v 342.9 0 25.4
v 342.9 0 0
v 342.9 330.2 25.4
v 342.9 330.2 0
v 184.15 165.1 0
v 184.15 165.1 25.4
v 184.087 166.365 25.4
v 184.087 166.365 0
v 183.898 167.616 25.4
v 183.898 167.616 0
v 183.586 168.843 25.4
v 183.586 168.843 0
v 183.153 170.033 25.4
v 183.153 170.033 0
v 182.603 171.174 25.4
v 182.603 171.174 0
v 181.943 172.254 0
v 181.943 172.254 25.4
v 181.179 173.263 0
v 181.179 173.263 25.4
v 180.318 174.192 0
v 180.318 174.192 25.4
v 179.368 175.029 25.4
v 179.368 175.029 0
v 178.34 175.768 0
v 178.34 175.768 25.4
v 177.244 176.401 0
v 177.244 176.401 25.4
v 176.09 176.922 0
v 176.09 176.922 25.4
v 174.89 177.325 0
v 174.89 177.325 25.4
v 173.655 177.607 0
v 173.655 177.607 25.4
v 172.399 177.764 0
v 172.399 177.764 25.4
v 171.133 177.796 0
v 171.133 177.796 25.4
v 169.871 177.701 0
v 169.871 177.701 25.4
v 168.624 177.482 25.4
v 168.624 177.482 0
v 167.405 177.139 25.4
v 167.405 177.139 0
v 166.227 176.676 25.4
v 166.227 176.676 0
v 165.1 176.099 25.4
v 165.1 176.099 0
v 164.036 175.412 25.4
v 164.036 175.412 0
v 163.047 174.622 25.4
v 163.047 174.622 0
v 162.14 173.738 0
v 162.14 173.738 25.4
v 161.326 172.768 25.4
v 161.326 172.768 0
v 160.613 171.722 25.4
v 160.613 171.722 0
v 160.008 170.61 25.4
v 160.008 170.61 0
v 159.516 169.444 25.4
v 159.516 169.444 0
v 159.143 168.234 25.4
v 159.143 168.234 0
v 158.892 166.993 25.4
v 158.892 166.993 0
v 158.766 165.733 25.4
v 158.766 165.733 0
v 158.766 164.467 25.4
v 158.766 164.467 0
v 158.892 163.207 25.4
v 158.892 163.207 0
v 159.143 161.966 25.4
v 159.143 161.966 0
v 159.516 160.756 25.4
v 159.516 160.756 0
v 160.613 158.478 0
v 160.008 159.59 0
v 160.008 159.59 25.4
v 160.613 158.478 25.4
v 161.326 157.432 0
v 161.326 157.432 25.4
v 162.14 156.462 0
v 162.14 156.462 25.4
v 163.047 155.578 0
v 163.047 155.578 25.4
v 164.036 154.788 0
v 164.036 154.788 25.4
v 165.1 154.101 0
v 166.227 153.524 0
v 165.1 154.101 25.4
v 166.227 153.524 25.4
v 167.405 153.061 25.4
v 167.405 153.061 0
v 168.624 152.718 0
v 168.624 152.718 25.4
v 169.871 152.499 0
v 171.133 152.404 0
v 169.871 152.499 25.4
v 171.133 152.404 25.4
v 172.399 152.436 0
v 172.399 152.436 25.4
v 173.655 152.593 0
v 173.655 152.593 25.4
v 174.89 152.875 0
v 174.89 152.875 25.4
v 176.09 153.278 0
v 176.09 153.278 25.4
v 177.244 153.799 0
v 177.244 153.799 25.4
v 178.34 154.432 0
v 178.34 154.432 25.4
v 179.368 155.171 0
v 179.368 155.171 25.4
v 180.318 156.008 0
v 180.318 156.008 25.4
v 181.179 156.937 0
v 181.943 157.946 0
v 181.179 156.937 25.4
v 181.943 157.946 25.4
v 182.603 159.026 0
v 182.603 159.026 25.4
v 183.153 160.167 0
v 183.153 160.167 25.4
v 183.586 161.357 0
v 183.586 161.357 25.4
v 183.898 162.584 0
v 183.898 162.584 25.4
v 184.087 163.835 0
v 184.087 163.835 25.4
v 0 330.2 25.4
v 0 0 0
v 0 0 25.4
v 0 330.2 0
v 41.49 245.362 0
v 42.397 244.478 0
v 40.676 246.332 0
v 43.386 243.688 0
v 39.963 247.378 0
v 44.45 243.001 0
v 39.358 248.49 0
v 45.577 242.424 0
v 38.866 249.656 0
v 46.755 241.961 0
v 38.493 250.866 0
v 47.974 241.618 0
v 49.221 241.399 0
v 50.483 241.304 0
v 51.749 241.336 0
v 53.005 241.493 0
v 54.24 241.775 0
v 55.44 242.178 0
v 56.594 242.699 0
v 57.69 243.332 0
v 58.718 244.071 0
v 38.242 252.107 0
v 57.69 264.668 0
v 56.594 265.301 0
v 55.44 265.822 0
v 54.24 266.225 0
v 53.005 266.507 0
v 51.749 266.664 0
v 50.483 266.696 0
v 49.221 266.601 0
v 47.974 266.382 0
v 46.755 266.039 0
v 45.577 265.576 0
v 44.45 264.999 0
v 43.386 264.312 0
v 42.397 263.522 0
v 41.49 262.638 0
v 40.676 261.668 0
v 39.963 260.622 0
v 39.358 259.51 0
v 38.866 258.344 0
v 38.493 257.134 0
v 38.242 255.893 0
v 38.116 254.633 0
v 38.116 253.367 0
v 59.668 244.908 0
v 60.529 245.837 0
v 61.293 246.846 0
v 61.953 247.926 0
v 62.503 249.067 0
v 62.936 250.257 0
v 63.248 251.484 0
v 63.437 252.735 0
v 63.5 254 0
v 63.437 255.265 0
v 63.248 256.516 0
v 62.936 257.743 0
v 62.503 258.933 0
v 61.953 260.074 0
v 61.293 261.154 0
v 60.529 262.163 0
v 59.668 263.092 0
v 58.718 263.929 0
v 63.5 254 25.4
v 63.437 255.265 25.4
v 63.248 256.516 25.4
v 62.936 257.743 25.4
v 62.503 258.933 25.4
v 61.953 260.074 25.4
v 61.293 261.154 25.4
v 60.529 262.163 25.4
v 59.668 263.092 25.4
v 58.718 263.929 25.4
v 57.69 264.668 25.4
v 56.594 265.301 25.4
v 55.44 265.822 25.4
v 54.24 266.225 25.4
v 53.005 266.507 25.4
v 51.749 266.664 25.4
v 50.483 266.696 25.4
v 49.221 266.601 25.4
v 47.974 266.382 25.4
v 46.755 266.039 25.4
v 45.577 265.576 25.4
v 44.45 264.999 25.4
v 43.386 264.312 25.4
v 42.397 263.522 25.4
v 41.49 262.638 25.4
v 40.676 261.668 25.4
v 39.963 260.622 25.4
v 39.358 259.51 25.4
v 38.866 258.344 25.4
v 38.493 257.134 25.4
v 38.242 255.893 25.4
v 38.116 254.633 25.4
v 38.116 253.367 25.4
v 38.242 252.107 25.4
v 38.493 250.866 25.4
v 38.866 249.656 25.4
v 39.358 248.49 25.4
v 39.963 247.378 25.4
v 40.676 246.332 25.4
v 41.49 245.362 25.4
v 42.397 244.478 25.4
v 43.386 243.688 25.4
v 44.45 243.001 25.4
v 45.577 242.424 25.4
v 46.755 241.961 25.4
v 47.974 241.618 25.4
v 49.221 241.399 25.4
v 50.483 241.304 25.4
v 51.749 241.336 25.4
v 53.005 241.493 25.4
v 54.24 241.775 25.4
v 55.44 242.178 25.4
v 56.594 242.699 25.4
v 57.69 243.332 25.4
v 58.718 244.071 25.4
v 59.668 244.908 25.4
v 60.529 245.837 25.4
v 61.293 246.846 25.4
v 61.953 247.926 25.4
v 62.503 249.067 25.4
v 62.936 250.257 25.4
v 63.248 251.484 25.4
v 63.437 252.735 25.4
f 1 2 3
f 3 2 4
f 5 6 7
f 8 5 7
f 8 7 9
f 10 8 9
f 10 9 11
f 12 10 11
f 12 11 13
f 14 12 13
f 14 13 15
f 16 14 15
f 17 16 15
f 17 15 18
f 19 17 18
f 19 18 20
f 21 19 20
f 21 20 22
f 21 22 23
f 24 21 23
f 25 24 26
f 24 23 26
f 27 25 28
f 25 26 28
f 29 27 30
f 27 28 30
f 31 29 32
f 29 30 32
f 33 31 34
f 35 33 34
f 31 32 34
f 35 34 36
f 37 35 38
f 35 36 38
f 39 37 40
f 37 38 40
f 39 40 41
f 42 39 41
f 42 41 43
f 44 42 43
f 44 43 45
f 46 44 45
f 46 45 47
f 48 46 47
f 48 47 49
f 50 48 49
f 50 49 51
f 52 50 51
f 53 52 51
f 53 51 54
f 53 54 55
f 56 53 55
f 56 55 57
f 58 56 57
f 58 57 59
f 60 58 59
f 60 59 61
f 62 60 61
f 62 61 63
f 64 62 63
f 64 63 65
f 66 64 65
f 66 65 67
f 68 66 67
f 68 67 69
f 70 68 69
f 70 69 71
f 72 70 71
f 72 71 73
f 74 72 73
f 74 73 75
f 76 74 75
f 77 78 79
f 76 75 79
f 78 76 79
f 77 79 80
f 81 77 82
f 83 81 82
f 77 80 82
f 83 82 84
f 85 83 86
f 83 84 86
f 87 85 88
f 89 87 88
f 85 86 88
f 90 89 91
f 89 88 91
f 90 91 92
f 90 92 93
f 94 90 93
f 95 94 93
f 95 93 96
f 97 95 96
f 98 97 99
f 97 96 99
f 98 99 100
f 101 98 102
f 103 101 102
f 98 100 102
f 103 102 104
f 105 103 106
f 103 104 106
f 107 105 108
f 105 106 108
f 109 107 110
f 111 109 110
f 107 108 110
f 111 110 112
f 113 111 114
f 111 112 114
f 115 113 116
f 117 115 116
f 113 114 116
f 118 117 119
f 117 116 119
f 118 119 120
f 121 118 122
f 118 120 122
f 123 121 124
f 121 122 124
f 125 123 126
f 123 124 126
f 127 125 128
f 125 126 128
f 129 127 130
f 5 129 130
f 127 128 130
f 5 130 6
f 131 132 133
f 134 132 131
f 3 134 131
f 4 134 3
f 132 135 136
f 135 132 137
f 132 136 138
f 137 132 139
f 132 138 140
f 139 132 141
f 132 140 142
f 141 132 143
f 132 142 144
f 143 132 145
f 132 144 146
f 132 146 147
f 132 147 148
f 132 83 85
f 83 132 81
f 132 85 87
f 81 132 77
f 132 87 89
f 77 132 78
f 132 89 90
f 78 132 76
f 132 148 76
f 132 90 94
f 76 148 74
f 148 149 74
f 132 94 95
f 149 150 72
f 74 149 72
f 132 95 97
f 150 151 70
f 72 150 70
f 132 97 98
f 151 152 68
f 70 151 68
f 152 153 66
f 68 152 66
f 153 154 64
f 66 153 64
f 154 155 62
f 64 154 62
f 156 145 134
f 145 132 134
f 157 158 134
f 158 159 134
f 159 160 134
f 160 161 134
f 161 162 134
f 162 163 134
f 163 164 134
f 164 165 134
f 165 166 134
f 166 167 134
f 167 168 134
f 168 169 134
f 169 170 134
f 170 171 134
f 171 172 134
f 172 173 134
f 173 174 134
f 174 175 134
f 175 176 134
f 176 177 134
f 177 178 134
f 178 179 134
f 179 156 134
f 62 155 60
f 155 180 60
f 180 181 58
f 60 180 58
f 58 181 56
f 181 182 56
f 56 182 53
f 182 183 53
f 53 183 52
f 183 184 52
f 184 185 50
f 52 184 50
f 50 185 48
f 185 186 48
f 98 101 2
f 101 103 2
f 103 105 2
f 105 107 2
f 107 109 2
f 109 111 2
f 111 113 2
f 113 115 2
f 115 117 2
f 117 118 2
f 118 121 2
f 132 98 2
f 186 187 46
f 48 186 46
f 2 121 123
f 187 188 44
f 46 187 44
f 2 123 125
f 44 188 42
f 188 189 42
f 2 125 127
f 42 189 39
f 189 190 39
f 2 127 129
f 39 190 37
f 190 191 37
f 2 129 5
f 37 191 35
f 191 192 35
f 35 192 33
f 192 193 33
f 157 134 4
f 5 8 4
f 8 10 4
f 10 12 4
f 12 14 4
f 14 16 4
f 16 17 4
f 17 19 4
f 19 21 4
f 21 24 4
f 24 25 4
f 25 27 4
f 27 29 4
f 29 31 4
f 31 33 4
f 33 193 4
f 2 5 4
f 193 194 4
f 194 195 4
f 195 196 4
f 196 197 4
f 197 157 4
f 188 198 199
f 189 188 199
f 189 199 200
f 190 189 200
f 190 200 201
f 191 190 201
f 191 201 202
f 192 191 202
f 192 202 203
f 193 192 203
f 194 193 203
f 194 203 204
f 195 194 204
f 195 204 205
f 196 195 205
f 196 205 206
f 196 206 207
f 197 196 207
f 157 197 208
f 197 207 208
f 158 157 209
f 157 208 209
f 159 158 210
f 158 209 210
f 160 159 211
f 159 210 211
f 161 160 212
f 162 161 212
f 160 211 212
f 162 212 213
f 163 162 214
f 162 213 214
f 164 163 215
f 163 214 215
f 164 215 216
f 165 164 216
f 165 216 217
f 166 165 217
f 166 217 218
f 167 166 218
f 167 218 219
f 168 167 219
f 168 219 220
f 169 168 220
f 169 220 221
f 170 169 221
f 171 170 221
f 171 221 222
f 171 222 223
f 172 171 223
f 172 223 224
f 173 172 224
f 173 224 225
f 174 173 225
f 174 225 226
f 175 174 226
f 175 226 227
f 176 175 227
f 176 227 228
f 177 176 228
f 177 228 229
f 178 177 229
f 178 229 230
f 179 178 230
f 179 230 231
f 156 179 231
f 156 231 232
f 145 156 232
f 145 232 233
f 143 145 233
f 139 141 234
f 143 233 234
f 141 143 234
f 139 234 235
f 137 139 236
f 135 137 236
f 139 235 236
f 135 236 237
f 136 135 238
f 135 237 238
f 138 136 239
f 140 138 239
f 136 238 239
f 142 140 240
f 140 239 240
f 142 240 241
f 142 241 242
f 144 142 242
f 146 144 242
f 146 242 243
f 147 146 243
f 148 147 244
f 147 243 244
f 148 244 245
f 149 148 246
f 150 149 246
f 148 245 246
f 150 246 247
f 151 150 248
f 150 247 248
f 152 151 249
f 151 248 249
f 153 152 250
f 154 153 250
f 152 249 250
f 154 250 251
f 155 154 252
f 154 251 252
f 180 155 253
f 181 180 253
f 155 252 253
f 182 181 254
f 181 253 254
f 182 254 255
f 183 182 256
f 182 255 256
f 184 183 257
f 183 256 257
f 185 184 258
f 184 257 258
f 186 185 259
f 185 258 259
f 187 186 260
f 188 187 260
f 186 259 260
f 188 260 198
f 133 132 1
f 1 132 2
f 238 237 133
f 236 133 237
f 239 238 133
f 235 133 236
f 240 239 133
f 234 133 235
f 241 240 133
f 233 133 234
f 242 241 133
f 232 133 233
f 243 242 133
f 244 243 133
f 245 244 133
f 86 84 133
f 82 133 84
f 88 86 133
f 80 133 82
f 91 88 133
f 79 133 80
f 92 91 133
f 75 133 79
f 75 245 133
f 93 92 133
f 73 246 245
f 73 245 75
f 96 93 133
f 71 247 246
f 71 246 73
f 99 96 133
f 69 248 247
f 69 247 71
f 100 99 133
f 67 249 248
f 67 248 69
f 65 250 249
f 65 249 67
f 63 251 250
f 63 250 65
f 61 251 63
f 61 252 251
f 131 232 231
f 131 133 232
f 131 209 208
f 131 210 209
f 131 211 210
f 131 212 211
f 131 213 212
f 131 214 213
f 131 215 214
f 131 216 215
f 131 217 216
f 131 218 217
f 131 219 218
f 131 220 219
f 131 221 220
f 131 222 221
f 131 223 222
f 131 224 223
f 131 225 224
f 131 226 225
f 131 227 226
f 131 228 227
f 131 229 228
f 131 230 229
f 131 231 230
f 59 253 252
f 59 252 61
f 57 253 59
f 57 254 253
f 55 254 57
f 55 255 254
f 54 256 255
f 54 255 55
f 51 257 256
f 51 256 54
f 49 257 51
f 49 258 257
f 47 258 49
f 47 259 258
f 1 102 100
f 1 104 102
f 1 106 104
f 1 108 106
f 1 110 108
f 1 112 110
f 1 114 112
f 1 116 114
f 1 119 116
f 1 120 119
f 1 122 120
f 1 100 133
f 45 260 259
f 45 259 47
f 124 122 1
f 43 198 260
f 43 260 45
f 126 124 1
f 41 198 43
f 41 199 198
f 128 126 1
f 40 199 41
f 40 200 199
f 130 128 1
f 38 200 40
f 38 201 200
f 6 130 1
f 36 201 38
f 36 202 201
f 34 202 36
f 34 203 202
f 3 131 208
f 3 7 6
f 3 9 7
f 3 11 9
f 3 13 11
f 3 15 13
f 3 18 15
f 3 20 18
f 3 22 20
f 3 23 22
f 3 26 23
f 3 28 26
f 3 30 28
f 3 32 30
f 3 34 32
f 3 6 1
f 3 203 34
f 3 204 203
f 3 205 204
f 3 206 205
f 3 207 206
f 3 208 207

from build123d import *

# Parameters (mm, degrees)
F0_W     = 342.9
F0_H     = 330.2
F1_DEPTH = 25.4
F2_R     = 12.7
F3_DEPTH = 25.401
F4_R     = 12.7
F5_DEPTH = 25.401


with BuildPart() as f1:
    # F0 (on Top) → F1 (new body)
    with BuildSketch(Plane.XY):
        with Locations((171.45, 165.1)):
            Rectangle(F0_W, F0_H)
    extrude(amount=F1_DEPTH)

    # F2 (on face) → F3 (cut, through all)
    with BuildSketch(Plane.XY.offset(25.4)):
        with Locations((50.8, 254)):
            Circle(F2_R)
    extrude(amount=-F3_DEPTH, mode=Mode.SUBTRACT)

    # F4 (on face) → F5 (cut, through all)
    with BuildSketch(Plane.XY.offset(25.4)):
        with Locations((171.45, 165.1)):
            Circle(F4_R)
    extrude(amount=-F5_DEPTH, mode=Mode.SUBTRACT)


solid = f1.part
